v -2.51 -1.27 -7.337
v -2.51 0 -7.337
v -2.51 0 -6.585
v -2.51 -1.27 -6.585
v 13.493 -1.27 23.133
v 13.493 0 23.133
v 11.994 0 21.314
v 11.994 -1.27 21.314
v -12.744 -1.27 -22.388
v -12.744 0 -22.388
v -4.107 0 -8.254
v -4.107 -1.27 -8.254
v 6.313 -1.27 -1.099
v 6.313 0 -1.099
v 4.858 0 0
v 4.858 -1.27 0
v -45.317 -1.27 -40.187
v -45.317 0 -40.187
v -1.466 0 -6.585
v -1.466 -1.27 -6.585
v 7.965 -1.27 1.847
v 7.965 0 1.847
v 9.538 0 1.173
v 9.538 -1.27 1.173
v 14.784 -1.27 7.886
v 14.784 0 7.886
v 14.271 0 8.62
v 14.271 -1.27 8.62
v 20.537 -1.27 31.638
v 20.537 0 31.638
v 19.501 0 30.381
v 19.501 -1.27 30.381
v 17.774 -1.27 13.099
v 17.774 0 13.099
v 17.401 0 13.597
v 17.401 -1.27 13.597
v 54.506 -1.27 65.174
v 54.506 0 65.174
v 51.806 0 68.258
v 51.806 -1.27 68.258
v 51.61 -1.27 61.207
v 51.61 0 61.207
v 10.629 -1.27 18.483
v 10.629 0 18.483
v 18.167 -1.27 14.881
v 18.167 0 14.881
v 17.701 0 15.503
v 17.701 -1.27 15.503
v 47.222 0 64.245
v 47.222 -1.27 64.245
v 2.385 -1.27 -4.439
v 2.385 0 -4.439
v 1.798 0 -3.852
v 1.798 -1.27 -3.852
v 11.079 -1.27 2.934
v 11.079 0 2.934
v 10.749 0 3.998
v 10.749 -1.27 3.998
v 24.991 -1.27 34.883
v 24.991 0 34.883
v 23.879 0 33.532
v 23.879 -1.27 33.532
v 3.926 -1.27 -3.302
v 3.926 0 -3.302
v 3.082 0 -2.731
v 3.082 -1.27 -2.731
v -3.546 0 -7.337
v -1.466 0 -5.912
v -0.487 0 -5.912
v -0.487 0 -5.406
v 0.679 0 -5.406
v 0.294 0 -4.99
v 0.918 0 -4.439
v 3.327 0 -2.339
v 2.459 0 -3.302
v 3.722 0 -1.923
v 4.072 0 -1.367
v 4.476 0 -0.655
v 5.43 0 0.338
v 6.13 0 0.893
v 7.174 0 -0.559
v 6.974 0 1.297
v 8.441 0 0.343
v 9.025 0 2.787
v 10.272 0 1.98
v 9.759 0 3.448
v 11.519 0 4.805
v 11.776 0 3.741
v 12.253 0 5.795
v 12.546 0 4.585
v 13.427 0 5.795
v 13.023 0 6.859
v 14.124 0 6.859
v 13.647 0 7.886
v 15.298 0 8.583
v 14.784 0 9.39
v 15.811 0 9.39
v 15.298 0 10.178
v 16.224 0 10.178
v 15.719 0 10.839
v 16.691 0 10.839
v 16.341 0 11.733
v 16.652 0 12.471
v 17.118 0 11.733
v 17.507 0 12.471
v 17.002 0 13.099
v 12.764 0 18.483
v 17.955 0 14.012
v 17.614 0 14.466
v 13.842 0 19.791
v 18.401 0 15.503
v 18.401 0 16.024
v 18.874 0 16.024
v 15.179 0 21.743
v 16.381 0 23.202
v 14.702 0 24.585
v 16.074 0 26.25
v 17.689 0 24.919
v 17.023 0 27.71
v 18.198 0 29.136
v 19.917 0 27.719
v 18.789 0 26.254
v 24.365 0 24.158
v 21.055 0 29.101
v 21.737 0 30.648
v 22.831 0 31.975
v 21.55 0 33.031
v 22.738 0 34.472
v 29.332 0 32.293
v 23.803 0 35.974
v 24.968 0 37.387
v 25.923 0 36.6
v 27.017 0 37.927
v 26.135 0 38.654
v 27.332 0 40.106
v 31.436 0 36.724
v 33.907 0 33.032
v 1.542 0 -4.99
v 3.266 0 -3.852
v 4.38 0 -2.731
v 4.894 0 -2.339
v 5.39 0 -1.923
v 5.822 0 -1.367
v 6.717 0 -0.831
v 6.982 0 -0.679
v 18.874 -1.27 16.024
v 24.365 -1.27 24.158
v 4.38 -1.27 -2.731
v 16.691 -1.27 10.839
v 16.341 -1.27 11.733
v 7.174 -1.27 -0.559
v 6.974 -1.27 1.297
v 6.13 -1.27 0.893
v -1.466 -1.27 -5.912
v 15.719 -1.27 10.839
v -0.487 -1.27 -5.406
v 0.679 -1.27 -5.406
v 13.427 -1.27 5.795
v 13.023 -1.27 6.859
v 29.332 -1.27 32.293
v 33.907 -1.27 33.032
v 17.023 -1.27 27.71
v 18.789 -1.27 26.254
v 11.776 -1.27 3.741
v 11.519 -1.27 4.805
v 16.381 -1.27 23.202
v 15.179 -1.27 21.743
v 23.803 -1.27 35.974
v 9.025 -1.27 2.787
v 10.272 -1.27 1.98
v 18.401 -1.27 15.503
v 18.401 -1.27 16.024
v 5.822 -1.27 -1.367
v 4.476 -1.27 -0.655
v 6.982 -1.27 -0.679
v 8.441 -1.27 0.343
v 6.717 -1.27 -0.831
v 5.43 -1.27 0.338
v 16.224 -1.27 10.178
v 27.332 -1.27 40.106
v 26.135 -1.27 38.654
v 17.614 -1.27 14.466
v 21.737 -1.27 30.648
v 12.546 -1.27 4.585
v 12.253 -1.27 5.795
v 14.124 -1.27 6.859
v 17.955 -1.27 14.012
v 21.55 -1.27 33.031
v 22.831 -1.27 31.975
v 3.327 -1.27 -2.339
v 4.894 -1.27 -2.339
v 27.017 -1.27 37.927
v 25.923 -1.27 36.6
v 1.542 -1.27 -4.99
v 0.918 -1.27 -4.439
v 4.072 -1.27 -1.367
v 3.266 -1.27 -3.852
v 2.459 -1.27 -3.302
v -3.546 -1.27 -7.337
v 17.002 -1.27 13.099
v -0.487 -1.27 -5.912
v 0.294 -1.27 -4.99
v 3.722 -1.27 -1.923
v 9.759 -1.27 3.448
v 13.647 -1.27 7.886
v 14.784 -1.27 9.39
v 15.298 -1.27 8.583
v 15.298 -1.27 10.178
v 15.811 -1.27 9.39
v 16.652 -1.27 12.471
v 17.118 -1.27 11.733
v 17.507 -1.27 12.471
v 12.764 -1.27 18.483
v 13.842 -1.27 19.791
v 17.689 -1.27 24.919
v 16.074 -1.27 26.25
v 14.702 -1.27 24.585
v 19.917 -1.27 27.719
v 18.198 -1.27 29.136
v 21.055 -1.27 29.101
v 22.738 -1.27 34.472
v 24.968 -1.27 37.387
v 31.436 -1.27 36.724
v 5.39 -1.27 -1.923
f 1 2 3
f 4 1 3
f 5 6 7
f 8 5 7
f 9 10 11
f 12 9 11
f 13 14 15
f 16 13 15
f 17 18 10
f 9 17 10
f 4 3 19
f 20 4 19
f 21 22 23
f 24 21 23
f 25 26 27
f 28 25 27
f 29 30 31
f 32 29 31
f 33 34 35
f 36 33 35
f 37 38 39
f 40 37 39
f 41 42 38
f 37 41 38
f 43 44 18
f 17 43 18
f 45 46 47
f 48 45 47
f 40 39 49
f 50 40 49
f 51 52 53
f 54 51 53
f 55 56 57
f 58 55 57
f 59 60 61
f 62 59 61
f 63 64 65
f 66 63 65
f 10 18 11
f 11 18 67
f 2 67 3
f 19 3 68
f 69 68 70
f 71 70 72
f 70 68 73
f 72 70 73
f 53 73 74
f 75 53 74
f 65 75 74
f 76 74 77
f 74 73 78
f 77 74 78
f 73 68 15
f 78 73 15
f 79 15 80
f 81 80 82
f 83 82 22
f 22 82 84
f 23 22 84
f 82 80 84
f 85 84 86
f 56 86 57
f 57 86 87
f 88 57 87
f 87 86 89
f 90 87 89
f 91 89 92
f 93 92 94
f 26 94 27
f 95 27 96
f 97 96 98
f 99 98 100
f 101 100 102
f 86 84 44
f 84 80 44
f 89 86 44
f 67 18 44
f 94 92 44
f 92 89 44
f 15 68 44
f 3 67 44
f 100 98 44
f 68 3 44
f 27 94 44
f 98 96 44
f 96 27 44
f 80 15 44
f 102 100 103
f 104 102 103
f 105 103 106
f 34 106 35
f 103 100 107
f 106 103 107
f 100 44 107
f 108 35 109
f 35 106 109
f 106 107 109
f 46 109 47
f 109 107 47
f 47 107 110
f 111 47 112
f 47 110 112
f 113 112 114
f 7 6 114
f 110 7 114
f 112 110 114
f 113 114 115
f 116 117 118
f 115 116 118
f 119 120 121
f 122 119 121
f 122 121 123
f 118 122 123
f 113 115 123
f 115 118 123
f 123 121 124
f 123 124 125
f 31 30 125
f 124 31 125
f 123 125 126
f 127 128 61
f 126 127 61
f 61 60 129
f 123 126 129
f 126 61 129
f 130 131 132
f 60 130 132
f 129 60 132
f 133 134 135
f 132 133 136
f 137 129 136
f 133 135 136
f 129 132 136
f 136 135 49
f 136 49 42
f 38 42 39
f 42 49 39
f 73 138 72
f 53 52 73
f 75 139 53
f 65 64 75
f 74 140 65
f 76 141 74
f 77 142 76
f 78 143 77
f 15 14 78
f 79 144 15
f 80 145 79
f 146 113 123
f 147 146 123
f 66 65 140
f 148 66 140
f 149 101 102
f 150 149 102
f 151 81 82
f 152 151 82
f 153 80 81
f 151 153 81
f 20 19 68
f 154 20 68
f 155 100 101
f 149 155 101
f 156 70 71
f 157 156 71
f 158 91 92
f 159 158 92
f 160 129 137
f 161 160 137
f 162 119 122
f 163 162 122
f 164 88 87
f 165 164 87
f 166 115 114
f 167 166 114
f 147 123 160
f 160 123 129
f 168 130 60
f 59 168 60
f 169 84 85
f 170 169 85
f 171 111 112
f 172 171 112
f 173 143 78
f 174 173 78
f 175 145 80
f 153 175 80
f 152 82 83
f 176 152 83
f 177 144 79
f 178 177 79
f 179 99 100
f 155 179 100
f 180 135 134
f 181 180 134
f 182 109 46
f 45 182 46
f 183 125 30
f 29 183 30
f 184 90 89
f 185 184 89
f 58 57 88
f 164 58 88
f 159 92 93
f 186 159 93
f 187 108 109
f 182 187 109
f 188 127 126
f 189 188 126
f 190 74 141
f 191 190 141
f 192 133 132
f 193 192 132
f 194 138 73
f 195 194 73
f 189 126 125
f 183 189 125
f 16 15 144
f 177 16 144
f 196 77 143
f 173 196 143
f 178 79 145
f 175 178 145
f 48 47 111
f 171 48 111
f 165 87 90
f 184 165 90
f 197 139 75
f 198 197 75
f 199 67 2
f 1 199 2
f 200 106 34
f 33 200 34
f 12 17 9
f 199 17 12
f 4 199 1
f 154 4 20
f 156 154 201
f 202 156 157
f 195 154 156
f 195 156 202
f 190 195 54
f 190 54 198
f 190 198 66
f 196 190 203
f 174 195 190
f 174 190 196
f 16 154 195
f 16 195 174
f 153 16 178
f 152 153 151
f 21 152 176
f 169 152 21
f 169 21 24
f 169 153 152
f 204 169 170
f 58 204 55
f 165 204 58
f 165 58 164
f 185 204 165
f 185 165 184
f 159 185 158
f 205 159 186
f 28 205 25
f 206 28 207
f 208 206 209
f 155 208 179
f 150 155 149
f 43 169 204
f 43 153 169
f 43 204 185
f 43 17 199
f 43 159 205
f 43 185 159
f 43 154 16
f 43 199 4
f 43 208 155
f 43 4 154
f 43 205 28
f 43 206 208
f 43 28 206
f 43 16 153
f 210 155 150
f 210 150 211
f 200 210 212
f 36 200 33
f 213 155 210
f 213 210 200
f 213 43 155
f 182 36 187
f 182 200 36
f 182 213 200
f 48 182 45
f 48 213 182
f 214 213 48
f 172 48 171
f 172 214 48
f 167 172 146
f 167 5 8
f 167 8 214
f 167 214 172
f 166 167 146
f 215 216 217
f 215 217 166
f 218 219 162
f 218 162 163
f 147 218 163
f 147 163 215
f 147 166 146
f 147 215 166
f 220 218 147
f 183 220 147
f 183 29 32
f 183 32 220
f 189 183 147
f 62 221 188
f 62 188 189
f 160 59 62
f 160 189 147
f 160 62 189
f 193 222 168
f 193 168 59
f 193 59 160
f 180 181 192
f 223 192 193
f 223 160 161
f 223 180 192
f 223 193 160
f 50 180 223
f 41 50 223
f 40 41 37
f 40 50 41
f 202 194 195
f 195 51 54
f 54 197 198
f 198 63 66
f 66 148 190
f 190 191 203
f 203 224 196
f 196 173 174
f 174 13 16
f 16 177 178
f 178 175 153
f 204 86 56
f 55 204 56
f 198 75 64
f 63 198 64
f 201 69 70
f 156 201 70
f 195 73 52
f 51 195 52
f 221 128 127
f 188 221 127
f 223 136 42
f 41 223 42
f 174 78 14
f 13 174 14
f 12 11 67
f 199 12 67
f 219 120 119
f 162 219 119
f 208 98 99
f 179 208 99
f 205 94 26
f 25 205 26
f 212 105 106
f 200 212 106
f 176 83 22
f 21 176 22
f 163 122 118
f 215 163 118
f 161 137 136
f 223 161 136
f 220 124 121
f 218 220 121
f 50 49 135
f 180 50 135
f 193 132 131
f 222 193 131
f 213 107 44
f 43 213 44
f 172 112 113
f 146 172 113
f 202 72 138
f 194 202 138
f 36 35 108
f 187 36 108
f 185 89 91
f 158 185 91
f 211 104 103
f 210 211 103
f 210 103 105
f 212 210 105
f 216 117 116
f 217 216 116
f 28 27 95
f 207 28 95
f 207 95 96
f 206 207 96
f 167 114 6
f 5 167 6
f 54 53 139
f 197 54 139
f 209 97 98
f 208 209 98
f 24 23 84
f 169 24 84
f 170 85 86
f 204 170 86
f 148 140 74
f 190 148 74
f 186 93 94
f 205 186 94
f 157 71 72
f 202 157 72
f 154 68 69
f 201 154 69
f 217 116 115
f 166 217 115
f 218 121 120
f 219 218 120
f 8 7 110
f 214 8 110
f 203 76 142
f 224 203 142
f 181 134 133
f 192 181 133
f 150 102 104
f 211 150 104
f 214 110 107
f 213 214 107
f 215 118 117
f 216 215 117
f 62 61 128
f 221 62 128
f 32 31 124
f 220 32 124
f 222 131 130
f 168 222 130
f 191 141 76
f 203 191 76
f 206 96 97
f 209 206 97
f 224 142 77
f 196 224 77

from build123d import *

# Parameters (mm, degrees)
F1_DEPTH = 1.27


with BuildPart() as f1:
    # F0 (on Front) → F1 (new body)
    with BuildSketch(Plane.XZ):
        Polygon((31.435996, 36.724295), (51.609881, 61.207164), (54.505855, 65.174182), (51.805742, 68.258226), (47.221687, 64.244838), (27.331568, 40.106345), align=None)
        Polygon((33.907399, 33.032119), (31.435996, 36.724295), (27.331568, 40.106345), (26.134862, 38.654033), (27.016983, 37.927165), (25.923324, 36.599909), (24.968057, 37.387049), (23.803444, 35.973684), (24.991162, 34.882604), (23.87859, 33.532396), (22.737729, 34.472465), (21.549792, 33.030793), (22.830821, 31.975225), (21.737482, 30.648356), (20.536821, 31.637701), (19.501161, 30.380832), (21.054899, 29.100551), (19.916793, 27.719354), (18.198055, 29.135594), (17.023039, 27.709604), (18.789157, 26.254323), (17.689198, 24.919421), (16.074062, 26.250293), (14.70201, 24.585181), (16.381021, 23.201676), (15.179227, 21.743188), (13.492946, 23.132684), (11.994152, 21.313759), (13.842246, 19.79093), (12.76418, 18.482599), (10.629401, 18.482599), (-45.317493, -40.18655), (-12.743622, -22.388158), (-4.106611, -8.254142), (-3.546211, -7.337077), (-2.509889, -7.337077), (-2.509889, -6.584582), (-1.465608, -6.584582), (-1.465608, -5.911632), (-0.487286, -5.911632), (-0.487286, -5.406398), (0.678638, -5.406398), (0.294408, -4.989546), (1.541625, -4.989546), (0.918016, -4.439303), (2.38533, -4.439303), (1.798405, -3.852378), (3.265719, -3.852378), (2.458696, -3.302135), (3.92601, -3.302135), (3.082028, -2.731179), (4.379619, -2.731179), (3.326856, -2.339453), (4.89376, -2.339453), (3.722346, -1.922547), (5.389937, -1.922547), (4.072334, -1.366683), (5.822276, -1.366683), (4.475968, -0.654733), (6.313379, -1.099426), (4.857528, 0), (6.717285, -0.830613), (5.429589, 0.337804), (6.98239, -0.678996), (6.13036, 0.893481), (7.173772, -0.558674), (6.974065, 1.296992), (8.441378, 0.343238), (7.964502, 1.847235), (9.538486, 1.173172), (9.024926, 2.787217), (10.272143, 1.980195), (9.758583, 3.447509), (11.079165, 2.933949), (10.74902, 3.997752), (11.77614, 3.740972), (11.519359, 4.804774), (12.54648, 4.584677), (12.253017, 5.795211), (13.426868, 5.795211), (13.023357, 6.859014), (14.123842, 6.859014), (13.646965, 7.886133), (14.784134, 7.886133), (14.270574, 8.619791), (15.297693, 8.583108), (14.784134, 9.390131), (15.811253, 9.390131), (15.297693, 10.178116), (16.224287, 10.178116), (15.719054, 10.838806), (16.690658, 10.838806), (16.34088, 11.732681), (17.118163, 11.732681), (16.651792, 12.471099), (17.506804, 12.471099), (17.001571, 13.099144), (17.774189, 13.099144), (17.401093, 13.596605), (17.954518, 14.011674), (17.614069, 14.465607), (18.167494, 14.880675), (17.701125, 15.502501), (18.400678, 15.502501), (18.400678, 16.024083), (18.874273, 16.024083), (24.364635, 24.158362), (29.332101, 32.292642), align=None)
    extrude(amount=F1_DEPTH)


solid = f1.part
